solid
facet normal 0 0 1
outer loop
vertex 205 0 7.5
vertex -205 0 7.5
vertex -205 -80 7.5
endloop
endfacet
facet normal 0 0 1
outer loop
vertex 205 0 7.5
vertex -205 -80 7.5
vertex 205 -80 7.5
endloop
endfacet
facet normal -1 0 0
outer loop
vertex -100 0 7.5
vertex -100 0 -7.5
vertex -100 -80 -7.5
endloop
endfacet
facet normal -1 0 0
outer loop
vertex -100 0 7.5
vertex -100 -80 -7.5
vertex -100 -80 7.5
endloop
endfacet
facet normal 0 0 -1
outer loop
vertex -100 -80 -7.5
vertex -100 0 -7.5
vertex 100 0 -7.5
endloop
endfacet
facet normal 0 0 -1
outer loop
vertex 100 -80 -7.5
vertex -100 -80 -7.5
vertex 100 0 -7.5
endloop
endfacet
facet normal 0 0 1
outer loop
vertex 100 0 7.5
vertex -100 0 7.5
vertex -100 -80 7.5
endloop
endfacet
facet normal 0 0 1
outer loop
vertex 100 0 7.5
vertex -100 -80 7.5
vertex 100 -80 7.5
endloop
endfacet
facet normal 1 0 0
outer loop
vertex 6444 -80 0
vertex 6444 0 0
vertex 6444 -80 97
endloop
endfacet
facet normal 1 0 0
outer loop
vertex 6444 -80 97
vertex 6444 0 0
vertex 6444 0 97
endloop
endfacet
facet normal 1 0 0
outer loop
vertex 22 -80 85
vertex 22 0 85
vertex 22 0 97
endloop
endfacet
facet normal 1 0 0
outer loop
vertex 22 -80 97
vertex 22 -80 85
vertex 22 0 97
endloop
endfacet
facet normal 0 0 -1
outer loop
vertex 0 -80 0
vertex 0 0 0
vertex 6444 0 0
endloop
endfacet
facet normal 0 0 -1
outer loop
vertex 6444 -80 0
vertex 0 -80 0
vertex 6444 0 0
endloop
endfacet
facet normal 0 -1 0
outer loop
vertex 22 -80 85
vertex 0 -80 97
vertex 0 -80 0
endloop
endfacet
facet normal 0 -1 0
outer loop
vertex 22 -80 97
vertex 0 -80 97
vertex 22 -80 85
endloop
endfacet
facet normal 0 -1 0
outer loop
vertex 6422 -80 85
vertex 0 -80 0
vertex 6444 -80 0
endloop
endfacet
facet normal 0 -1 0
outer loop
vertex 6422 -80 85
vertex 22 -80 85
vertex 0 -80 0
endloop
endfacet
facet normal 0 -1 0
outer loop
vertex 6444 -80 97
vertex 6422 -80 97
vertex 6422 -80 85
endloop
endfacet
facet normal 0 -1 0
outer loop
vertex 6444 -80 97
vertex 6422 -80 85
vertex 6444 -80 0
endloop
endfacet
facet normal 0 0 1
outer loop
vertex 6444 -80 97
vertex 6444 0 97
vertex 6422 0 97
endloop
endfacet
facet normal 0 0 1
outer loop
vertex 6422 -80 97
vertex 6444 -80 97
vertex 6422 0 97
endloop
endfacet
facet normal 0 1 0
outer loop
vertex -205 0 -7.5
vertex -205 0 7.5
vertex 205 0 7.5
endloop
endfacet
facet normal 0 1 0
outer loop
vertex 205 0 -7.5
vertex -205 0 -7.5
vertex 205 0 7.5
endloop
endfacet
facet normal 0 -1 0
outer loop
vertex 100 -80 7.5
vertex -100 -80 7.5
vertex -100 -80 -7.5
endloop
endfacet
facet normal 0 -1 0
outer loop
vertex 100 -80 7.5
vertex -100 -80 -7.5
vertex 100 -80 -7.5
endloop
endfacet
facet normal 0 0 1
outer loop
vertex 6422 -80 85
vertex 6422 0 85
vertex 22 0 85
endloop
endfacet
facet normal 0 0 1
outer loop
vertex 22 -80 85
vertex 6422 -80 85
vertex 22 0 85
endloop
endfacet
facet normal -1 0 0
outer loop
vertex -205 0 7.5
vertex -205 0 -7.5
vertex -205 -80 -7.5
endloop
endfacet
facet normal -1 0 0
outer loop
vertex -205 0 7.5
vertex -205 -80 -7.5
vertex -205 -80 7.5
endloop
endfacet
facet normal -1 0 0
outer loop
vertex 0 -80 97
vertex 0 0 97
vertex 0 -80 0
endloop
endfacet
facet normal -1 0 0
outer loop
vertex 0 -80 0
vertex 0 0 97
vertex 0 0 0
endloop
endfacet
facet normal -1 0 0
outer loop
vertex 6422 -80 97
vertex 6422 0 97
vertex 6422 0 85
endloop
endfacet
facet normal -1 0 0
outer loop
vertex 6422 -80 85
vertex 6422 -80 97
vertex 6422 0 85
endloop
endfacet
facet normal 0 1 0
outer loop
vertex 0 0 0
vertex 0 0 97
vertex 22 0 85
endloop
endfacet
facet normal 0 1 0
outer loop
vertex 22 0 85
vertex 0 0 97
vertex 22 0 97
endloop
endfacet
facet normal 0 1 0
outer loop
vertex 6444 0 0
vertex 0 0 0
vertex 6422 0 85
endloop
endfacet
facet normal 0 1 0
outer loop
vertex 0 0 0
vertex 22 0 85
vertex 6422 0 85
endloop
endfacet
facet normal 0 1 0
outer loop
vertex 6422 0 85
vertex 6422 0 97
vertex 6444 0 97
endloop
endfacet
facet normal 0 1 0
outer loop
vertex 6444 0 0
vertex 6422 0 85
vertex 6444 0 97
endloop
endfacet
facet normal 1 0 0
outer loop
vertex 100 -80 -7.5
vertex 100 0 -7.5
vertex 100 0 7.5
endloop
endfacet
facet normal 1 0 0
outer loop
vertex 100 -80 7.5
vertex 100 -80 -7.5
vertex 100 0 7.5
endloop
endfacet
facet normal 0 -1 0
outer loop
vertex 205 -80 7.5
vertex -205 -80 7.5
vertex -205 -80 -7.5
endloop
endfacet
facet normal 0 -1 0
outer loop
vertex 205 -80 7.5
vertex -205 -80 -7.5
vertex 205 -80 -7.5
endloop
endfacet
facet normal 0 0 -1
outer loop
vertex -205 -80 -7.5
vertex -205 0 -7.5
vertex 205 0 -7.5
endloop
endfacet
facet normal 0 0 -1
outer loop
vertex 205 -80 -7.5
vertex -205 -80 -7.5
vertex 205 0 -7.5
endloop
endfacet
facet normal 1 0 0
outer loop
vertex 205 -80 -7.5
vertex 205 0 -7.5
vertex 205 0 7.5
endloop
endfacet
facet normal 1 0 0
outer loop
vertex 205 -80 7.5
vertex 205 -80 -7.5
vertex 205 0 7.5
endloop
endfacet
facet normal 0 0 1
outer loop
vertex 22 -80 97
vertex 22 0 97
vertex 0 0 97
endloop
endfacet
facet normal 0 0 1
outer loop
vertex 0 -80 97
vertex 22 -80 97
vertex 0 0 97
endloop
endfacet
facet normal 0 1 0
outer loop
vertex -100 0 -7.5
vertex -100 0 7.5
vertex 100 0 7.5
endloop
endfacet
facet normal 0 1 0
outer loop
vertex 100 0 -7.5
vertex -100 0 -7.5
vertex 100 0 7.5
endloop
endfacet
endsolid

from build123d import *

# Parameters (mm, degrees)
F1_DEPTH = 80
F2_W     = 410
F2_H     = 15
F3_DEPTH = 80
F4_W     = 200
F4_H     = 15
F5_DEPTH = 80


with BuildPart() as f1:
    # F0 (on Front) → F1 (new body)
    with BuildSketch(Plane.XZ):
        Polygon((22, 97), (0, 97), (0, 0), (6444, 0), (6444, 97), (6422, 97), (6422, 85), (22, 85), align=None)
    extrude(amount=F1_DEPTH)


with BuildPart() as f3:
    # F2 (on Front) → F3 (new body)
    with BuildSketch(Plane.XZ):
        Rectangle(F2_W, F2_H)
    extrude(amount=F3_DEPTH)


with BuildPart() as f5:
    # F4 (on Front) → F5 (new body)
    with BuildSketch(Plane.XZ):
        Rectangle(F4_W, F4_H)
    extrude(amount=F5_DEPTH)


solid = Compound([f1.part, f3.part, f5.part])
